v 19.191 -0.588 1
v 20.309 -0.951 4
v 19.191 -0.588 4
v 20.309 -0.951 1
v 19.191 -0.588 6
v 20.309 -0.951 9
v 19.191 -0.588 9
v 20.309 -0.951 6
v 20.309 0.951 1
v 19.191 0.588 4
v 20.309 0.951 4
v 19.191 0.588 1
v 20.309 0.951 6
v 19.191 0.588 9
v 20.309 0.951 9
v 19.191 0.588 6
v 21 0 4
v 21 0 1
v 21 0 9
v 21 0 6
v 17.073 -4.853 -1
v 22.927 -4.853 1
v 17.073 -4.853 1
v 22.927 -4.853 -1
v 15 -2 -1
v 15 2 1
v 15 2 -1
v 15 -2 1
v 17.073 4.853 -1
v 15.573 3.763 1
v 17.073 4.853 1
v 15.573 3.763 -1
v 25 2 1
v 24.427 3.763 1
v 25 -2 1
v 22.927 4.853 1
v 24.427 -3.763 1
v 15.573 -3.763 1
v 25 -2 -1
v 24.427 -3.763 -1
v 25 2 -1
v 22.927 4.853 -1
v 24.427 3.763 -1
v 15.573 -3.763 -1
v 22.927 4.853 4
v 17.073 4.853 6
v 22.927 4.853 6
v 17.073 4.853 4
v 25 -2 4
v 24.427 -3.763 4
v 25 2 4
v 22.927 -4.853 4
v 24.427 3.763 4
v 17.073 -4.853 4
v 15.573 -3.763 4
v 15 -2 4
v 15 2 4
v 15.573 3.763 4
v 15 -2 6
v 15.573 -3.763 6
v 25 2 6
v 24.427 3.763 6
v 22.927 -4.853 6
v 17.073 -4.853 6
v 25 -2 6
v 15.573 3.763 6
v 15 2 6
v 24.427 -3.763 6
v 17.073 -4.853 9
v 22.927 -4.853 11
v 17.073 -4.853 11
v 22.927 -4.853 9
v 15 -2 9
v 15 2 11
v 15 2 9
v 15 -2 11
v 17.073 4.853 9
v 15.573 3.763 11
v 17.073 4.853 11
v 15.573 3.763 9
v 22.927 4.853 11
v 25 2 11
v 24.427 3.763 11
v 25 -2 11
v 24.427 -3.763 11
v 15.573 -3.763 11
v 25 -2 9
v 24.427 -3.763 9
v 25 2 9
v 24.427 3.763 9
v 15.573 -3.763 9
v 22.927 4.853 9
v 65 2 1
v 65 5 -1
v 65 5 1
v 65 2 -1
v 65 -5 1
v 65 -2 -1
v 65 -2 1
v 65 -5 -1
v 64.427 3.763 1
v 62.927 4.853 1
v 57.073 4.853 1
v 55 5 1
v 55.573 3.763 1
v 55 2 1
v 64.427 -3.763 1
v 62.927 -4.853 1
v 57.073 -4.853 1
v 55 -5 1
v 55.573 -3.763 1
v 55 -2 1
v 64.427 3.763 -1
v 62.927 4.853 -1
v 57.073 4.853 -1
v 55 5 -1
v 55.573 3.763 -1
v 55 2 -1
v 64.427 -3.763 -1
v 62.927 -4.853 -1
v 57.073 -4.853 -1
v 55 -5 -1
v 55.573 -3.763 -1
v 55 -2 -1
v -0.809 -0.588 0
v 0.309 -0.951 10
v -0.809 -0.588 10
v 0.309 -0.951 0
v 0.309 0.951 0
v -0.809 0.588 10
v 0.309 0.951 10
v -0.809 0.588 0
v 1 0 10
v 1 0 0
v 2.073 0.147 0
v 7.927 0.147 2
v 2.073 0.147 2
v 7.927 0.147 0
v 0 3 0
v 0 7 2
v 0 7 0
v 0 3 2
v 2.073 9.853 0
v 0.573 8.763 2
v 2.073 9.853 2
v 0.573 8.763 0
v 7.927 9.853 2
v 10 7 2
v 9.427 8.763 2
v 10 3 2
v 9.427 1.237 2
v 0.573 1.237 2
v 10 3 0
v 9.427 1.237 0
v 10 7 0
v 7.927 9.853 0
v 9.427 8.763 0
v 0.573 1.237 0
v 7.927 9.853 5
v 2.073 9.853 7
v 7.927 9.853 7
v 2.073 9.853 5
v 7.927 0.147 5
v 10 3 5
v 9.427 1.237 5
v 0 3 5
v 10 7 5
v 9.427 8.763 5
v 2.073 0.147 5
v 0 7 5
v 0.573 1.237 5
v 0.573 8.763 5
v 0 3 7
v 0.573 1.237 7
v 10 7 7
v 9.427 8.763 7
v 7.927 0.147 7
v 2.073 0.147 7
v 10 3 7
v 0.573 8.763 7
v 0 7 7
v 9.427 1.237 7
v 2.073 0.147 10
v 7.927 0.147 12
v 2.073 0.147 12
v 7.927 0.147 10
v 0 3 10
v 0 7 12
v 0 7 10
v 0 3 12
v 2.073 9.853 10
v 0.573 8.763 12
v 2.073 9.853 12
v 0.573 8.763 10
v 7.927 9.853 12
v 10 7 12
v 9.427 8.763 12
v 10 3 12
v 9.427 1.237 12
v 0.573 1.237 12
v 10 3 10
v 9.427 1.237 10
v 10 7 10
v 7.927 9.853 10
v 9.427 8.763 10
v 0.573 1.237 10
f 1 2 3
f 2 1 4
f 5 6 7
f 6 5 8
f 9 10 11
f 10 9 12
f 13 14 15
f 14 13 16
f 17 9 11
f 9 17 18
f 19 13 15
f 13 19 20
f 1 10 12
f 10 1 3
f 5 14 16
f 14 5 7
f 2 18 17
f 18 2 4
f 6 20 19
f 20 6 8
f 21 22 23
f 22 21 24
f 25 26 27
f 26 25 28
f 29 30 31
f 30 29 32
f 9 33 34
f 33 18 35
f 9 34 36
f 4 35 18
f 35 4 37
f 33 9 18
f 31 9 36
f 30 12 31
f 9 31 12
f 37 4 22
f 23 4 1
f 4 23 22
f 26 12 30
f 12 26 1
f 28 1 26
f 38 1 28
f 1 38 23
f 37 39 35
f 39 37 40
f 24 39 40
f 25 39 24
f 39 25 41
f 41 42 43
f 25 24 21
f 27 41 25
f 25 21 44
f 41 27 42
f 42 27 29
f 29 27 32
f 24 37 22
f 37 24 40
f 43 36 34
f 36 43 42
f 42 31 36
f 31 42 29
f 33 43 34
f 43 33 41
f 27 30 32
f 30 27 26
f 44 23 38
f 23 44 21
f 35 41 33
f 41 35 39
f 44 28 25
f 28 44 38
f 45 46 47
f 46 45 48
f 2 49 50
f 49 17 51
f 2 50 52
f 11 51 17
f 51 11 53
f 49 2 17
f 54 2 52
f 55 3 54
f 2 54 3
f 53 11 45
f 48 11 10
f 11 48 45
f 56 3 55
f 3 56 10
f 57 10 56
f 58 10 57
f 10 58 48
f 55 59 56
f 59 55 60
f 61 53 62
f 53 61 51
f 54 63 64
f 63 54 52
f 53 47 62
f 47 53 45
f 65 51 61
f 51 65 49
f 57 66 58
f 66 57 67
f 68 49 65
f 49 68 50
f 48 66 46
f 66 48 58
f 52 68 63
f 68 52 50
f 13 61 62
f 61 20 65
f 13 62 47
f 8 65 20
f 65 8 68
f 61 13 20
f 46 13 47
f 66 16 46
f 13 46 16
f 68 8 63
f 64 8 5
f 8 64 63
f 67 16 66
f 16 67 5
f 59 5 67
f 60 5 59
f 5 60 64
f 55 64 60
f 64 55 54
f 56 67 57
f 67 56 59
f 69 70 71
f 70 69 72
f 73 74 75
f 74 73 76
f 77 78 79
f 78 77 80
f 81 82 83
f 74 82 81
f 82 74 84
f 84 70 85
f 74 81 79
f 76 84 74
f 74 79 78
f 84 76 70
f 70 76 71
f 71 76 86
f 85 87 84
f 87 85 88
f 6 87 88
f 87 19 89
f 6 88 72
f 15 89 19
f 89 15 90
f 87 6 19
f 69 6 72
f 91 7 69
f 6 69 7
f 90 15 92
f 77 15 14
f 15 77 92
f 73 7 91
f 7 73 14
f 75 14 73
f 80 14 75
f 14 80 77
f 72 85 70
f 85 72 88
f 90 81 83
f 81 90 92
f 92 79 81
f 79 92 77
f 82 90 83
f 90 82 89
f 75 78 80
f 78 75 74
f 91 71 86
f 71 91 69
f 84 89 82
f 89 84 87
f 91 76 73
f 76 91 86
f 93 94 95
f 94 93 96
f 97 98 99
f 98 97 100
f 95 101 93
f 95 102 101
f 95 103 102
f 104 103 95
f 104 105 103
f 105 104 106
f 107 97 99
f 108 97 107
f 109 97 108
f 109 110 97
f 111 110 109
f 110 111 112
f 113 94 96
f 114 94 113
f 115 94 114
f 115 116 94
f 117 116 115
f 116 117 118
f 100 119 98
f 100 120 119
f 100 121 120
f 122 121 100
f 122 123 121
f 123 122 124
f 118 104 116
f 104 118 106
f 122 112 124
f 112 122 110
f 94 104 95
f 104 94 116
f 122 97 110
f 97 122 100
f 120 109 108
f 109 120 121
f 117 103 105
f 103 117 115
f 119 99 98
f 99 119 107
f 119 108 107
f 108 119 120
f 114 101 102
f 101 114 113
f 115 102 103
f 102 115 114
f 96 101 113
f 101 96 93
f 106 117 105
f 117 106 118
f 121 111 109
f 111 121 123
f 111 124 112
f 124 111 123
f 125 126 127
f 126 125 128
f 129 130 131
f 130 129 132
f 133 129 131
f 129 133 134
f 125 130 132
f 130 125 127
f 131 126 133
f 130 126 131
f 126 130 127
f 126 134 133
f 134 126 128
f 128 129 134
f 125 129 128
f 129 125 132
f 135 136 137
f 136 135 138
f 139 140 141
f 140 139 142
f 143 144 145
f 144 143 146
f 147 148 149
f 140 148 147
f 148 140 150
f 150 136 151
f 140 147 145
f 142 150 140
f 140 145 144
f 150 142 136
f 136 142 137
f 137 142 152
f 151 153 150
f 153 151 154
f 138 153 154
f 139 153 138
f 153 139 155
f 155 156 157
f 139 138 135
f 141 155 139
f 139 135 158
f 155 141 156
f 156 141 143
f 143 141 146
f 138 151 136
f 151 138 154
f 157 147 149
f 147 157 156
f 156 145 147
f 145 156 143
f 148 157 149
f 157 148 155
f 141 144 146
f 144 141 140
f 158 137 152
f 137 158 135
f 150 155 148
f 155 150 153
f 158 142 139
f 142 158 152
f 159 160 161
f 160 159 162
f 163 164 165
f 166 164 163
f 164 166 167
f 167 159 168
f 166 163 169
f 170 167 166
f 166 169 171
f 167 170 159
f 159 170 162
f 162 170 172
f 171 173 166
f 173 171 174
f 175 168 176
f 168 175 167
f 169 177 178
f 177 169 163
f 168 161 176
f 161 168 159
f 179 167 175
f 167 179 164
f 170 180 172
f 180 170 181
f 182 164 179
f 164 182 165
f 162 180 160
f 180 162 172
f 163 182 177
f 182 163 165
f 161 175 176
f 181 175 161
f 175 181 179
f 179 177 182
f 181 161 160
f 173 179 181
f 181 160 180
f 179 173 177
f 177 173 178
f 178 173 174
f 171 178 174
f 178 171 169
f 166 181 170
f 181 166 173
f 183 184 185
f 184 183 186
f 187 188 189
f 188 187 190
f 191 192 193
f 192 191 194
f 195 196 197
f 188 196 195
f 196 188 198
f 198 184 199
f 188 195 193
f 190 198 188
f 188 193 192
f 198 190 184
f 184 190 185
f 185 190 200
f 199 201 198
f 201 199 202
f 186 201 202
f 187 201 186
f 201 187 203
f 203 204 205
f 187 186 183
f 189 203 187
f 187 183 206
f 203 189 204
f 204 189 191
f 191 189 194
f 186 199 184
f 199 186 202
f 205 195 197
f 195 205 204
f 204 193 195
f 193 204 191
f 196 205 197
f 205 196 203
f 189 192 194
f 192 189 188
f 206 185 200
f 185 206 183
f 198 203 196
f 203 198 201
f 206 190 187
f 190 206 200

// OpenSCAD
// Do a rounded cube, using the minkowski
module rounded_cube(x, y, h, r, center=true) {
  rounded_cube_hull(x,y,h,r,center);
}

// Do a rounded cube, using the minkowski
module rounded_cube_minkowski(x, y, h, r, center=true) {
  if (center) {
    translate([-x/2,-y/2,-h/2])
      rounded_cube_minkowski(x, y, h, r, center=false);
  } else {
    translate([r,r,0])
    minkowski() {
      cube([x-2*r,y-2*r,h/2]);
      cylinder(h=h/2, r=r);
    }
  }
}

// Do a rounded cube, using the hull method
module rounded_cube_hull(x, y, h, r, center=true) {

  dx = x-2*r;
  dy = y-2*r;

  if (center) {
    translate([-x/2,-y/2,-h/2])
      rounded_cube(x, y, h, r, false);
  } else {
    translate([r, r, 0]){
      hull() {
        hull() {
          cylinder(r=r,h=h);
          translate([dx,0,0])
          cylinder(r=r,h=h);
        }
        hull() {
          translate([0, dy, 0])
          cylinder(r=r,h=h);
          translate([dx, dy, 0])
          cylinder(r=r,h=h);
        }
      }
    }
  }
}

// Testing
echo("##########");
echo("In rounded_cube.scad");
echo("This file should not be included, use ''use <filemane>'' instead.");
echo("##########");

/*$fn = 200;*/
p = 1;
if (p==1) {
  cylinder(r=1,h=10);
  rounded_cube(10,10,2,3,center=false);
  translate([0,0,5])
    rounded_cube_minkowski(10,10,2,3,center=false);
  translate([0,0,10])
    rounded_cube_hull(10,10,2,3,center=false);

  translate([20,0,0]) {
    cylinder(r=1,h=10);
    rounded_cube(10,10,2,3,center=true);
    translate([0,0,5])
      rounded_cube_minkowski(10,10,2,3,center=true);
    translate([0,0,10])
      rounded_cube_hull(10,10,2,3,center=true);
  }

  translate([40,0,0]) {
    difference() {
      // minkowski is slighlty bigger than hull (view CGLA in openscad)
      // I think the hull one is more clean
      // when we use a $fn big these differences decrease
      rounded_cube_minkowski(10,10,2,3,center=true);
      rounded_cube_hull(10,10,2,3,center=true);
    }
  }

  translate([60,0,0]) {
    difference() {
      // but it is not the same size than a real cube..
      // when we use a $fn big these differences decrease
      cube([10,10,2], center=true);
      rounded_cube_hull(10,10,2,3,center=true);
    }
  }
}
